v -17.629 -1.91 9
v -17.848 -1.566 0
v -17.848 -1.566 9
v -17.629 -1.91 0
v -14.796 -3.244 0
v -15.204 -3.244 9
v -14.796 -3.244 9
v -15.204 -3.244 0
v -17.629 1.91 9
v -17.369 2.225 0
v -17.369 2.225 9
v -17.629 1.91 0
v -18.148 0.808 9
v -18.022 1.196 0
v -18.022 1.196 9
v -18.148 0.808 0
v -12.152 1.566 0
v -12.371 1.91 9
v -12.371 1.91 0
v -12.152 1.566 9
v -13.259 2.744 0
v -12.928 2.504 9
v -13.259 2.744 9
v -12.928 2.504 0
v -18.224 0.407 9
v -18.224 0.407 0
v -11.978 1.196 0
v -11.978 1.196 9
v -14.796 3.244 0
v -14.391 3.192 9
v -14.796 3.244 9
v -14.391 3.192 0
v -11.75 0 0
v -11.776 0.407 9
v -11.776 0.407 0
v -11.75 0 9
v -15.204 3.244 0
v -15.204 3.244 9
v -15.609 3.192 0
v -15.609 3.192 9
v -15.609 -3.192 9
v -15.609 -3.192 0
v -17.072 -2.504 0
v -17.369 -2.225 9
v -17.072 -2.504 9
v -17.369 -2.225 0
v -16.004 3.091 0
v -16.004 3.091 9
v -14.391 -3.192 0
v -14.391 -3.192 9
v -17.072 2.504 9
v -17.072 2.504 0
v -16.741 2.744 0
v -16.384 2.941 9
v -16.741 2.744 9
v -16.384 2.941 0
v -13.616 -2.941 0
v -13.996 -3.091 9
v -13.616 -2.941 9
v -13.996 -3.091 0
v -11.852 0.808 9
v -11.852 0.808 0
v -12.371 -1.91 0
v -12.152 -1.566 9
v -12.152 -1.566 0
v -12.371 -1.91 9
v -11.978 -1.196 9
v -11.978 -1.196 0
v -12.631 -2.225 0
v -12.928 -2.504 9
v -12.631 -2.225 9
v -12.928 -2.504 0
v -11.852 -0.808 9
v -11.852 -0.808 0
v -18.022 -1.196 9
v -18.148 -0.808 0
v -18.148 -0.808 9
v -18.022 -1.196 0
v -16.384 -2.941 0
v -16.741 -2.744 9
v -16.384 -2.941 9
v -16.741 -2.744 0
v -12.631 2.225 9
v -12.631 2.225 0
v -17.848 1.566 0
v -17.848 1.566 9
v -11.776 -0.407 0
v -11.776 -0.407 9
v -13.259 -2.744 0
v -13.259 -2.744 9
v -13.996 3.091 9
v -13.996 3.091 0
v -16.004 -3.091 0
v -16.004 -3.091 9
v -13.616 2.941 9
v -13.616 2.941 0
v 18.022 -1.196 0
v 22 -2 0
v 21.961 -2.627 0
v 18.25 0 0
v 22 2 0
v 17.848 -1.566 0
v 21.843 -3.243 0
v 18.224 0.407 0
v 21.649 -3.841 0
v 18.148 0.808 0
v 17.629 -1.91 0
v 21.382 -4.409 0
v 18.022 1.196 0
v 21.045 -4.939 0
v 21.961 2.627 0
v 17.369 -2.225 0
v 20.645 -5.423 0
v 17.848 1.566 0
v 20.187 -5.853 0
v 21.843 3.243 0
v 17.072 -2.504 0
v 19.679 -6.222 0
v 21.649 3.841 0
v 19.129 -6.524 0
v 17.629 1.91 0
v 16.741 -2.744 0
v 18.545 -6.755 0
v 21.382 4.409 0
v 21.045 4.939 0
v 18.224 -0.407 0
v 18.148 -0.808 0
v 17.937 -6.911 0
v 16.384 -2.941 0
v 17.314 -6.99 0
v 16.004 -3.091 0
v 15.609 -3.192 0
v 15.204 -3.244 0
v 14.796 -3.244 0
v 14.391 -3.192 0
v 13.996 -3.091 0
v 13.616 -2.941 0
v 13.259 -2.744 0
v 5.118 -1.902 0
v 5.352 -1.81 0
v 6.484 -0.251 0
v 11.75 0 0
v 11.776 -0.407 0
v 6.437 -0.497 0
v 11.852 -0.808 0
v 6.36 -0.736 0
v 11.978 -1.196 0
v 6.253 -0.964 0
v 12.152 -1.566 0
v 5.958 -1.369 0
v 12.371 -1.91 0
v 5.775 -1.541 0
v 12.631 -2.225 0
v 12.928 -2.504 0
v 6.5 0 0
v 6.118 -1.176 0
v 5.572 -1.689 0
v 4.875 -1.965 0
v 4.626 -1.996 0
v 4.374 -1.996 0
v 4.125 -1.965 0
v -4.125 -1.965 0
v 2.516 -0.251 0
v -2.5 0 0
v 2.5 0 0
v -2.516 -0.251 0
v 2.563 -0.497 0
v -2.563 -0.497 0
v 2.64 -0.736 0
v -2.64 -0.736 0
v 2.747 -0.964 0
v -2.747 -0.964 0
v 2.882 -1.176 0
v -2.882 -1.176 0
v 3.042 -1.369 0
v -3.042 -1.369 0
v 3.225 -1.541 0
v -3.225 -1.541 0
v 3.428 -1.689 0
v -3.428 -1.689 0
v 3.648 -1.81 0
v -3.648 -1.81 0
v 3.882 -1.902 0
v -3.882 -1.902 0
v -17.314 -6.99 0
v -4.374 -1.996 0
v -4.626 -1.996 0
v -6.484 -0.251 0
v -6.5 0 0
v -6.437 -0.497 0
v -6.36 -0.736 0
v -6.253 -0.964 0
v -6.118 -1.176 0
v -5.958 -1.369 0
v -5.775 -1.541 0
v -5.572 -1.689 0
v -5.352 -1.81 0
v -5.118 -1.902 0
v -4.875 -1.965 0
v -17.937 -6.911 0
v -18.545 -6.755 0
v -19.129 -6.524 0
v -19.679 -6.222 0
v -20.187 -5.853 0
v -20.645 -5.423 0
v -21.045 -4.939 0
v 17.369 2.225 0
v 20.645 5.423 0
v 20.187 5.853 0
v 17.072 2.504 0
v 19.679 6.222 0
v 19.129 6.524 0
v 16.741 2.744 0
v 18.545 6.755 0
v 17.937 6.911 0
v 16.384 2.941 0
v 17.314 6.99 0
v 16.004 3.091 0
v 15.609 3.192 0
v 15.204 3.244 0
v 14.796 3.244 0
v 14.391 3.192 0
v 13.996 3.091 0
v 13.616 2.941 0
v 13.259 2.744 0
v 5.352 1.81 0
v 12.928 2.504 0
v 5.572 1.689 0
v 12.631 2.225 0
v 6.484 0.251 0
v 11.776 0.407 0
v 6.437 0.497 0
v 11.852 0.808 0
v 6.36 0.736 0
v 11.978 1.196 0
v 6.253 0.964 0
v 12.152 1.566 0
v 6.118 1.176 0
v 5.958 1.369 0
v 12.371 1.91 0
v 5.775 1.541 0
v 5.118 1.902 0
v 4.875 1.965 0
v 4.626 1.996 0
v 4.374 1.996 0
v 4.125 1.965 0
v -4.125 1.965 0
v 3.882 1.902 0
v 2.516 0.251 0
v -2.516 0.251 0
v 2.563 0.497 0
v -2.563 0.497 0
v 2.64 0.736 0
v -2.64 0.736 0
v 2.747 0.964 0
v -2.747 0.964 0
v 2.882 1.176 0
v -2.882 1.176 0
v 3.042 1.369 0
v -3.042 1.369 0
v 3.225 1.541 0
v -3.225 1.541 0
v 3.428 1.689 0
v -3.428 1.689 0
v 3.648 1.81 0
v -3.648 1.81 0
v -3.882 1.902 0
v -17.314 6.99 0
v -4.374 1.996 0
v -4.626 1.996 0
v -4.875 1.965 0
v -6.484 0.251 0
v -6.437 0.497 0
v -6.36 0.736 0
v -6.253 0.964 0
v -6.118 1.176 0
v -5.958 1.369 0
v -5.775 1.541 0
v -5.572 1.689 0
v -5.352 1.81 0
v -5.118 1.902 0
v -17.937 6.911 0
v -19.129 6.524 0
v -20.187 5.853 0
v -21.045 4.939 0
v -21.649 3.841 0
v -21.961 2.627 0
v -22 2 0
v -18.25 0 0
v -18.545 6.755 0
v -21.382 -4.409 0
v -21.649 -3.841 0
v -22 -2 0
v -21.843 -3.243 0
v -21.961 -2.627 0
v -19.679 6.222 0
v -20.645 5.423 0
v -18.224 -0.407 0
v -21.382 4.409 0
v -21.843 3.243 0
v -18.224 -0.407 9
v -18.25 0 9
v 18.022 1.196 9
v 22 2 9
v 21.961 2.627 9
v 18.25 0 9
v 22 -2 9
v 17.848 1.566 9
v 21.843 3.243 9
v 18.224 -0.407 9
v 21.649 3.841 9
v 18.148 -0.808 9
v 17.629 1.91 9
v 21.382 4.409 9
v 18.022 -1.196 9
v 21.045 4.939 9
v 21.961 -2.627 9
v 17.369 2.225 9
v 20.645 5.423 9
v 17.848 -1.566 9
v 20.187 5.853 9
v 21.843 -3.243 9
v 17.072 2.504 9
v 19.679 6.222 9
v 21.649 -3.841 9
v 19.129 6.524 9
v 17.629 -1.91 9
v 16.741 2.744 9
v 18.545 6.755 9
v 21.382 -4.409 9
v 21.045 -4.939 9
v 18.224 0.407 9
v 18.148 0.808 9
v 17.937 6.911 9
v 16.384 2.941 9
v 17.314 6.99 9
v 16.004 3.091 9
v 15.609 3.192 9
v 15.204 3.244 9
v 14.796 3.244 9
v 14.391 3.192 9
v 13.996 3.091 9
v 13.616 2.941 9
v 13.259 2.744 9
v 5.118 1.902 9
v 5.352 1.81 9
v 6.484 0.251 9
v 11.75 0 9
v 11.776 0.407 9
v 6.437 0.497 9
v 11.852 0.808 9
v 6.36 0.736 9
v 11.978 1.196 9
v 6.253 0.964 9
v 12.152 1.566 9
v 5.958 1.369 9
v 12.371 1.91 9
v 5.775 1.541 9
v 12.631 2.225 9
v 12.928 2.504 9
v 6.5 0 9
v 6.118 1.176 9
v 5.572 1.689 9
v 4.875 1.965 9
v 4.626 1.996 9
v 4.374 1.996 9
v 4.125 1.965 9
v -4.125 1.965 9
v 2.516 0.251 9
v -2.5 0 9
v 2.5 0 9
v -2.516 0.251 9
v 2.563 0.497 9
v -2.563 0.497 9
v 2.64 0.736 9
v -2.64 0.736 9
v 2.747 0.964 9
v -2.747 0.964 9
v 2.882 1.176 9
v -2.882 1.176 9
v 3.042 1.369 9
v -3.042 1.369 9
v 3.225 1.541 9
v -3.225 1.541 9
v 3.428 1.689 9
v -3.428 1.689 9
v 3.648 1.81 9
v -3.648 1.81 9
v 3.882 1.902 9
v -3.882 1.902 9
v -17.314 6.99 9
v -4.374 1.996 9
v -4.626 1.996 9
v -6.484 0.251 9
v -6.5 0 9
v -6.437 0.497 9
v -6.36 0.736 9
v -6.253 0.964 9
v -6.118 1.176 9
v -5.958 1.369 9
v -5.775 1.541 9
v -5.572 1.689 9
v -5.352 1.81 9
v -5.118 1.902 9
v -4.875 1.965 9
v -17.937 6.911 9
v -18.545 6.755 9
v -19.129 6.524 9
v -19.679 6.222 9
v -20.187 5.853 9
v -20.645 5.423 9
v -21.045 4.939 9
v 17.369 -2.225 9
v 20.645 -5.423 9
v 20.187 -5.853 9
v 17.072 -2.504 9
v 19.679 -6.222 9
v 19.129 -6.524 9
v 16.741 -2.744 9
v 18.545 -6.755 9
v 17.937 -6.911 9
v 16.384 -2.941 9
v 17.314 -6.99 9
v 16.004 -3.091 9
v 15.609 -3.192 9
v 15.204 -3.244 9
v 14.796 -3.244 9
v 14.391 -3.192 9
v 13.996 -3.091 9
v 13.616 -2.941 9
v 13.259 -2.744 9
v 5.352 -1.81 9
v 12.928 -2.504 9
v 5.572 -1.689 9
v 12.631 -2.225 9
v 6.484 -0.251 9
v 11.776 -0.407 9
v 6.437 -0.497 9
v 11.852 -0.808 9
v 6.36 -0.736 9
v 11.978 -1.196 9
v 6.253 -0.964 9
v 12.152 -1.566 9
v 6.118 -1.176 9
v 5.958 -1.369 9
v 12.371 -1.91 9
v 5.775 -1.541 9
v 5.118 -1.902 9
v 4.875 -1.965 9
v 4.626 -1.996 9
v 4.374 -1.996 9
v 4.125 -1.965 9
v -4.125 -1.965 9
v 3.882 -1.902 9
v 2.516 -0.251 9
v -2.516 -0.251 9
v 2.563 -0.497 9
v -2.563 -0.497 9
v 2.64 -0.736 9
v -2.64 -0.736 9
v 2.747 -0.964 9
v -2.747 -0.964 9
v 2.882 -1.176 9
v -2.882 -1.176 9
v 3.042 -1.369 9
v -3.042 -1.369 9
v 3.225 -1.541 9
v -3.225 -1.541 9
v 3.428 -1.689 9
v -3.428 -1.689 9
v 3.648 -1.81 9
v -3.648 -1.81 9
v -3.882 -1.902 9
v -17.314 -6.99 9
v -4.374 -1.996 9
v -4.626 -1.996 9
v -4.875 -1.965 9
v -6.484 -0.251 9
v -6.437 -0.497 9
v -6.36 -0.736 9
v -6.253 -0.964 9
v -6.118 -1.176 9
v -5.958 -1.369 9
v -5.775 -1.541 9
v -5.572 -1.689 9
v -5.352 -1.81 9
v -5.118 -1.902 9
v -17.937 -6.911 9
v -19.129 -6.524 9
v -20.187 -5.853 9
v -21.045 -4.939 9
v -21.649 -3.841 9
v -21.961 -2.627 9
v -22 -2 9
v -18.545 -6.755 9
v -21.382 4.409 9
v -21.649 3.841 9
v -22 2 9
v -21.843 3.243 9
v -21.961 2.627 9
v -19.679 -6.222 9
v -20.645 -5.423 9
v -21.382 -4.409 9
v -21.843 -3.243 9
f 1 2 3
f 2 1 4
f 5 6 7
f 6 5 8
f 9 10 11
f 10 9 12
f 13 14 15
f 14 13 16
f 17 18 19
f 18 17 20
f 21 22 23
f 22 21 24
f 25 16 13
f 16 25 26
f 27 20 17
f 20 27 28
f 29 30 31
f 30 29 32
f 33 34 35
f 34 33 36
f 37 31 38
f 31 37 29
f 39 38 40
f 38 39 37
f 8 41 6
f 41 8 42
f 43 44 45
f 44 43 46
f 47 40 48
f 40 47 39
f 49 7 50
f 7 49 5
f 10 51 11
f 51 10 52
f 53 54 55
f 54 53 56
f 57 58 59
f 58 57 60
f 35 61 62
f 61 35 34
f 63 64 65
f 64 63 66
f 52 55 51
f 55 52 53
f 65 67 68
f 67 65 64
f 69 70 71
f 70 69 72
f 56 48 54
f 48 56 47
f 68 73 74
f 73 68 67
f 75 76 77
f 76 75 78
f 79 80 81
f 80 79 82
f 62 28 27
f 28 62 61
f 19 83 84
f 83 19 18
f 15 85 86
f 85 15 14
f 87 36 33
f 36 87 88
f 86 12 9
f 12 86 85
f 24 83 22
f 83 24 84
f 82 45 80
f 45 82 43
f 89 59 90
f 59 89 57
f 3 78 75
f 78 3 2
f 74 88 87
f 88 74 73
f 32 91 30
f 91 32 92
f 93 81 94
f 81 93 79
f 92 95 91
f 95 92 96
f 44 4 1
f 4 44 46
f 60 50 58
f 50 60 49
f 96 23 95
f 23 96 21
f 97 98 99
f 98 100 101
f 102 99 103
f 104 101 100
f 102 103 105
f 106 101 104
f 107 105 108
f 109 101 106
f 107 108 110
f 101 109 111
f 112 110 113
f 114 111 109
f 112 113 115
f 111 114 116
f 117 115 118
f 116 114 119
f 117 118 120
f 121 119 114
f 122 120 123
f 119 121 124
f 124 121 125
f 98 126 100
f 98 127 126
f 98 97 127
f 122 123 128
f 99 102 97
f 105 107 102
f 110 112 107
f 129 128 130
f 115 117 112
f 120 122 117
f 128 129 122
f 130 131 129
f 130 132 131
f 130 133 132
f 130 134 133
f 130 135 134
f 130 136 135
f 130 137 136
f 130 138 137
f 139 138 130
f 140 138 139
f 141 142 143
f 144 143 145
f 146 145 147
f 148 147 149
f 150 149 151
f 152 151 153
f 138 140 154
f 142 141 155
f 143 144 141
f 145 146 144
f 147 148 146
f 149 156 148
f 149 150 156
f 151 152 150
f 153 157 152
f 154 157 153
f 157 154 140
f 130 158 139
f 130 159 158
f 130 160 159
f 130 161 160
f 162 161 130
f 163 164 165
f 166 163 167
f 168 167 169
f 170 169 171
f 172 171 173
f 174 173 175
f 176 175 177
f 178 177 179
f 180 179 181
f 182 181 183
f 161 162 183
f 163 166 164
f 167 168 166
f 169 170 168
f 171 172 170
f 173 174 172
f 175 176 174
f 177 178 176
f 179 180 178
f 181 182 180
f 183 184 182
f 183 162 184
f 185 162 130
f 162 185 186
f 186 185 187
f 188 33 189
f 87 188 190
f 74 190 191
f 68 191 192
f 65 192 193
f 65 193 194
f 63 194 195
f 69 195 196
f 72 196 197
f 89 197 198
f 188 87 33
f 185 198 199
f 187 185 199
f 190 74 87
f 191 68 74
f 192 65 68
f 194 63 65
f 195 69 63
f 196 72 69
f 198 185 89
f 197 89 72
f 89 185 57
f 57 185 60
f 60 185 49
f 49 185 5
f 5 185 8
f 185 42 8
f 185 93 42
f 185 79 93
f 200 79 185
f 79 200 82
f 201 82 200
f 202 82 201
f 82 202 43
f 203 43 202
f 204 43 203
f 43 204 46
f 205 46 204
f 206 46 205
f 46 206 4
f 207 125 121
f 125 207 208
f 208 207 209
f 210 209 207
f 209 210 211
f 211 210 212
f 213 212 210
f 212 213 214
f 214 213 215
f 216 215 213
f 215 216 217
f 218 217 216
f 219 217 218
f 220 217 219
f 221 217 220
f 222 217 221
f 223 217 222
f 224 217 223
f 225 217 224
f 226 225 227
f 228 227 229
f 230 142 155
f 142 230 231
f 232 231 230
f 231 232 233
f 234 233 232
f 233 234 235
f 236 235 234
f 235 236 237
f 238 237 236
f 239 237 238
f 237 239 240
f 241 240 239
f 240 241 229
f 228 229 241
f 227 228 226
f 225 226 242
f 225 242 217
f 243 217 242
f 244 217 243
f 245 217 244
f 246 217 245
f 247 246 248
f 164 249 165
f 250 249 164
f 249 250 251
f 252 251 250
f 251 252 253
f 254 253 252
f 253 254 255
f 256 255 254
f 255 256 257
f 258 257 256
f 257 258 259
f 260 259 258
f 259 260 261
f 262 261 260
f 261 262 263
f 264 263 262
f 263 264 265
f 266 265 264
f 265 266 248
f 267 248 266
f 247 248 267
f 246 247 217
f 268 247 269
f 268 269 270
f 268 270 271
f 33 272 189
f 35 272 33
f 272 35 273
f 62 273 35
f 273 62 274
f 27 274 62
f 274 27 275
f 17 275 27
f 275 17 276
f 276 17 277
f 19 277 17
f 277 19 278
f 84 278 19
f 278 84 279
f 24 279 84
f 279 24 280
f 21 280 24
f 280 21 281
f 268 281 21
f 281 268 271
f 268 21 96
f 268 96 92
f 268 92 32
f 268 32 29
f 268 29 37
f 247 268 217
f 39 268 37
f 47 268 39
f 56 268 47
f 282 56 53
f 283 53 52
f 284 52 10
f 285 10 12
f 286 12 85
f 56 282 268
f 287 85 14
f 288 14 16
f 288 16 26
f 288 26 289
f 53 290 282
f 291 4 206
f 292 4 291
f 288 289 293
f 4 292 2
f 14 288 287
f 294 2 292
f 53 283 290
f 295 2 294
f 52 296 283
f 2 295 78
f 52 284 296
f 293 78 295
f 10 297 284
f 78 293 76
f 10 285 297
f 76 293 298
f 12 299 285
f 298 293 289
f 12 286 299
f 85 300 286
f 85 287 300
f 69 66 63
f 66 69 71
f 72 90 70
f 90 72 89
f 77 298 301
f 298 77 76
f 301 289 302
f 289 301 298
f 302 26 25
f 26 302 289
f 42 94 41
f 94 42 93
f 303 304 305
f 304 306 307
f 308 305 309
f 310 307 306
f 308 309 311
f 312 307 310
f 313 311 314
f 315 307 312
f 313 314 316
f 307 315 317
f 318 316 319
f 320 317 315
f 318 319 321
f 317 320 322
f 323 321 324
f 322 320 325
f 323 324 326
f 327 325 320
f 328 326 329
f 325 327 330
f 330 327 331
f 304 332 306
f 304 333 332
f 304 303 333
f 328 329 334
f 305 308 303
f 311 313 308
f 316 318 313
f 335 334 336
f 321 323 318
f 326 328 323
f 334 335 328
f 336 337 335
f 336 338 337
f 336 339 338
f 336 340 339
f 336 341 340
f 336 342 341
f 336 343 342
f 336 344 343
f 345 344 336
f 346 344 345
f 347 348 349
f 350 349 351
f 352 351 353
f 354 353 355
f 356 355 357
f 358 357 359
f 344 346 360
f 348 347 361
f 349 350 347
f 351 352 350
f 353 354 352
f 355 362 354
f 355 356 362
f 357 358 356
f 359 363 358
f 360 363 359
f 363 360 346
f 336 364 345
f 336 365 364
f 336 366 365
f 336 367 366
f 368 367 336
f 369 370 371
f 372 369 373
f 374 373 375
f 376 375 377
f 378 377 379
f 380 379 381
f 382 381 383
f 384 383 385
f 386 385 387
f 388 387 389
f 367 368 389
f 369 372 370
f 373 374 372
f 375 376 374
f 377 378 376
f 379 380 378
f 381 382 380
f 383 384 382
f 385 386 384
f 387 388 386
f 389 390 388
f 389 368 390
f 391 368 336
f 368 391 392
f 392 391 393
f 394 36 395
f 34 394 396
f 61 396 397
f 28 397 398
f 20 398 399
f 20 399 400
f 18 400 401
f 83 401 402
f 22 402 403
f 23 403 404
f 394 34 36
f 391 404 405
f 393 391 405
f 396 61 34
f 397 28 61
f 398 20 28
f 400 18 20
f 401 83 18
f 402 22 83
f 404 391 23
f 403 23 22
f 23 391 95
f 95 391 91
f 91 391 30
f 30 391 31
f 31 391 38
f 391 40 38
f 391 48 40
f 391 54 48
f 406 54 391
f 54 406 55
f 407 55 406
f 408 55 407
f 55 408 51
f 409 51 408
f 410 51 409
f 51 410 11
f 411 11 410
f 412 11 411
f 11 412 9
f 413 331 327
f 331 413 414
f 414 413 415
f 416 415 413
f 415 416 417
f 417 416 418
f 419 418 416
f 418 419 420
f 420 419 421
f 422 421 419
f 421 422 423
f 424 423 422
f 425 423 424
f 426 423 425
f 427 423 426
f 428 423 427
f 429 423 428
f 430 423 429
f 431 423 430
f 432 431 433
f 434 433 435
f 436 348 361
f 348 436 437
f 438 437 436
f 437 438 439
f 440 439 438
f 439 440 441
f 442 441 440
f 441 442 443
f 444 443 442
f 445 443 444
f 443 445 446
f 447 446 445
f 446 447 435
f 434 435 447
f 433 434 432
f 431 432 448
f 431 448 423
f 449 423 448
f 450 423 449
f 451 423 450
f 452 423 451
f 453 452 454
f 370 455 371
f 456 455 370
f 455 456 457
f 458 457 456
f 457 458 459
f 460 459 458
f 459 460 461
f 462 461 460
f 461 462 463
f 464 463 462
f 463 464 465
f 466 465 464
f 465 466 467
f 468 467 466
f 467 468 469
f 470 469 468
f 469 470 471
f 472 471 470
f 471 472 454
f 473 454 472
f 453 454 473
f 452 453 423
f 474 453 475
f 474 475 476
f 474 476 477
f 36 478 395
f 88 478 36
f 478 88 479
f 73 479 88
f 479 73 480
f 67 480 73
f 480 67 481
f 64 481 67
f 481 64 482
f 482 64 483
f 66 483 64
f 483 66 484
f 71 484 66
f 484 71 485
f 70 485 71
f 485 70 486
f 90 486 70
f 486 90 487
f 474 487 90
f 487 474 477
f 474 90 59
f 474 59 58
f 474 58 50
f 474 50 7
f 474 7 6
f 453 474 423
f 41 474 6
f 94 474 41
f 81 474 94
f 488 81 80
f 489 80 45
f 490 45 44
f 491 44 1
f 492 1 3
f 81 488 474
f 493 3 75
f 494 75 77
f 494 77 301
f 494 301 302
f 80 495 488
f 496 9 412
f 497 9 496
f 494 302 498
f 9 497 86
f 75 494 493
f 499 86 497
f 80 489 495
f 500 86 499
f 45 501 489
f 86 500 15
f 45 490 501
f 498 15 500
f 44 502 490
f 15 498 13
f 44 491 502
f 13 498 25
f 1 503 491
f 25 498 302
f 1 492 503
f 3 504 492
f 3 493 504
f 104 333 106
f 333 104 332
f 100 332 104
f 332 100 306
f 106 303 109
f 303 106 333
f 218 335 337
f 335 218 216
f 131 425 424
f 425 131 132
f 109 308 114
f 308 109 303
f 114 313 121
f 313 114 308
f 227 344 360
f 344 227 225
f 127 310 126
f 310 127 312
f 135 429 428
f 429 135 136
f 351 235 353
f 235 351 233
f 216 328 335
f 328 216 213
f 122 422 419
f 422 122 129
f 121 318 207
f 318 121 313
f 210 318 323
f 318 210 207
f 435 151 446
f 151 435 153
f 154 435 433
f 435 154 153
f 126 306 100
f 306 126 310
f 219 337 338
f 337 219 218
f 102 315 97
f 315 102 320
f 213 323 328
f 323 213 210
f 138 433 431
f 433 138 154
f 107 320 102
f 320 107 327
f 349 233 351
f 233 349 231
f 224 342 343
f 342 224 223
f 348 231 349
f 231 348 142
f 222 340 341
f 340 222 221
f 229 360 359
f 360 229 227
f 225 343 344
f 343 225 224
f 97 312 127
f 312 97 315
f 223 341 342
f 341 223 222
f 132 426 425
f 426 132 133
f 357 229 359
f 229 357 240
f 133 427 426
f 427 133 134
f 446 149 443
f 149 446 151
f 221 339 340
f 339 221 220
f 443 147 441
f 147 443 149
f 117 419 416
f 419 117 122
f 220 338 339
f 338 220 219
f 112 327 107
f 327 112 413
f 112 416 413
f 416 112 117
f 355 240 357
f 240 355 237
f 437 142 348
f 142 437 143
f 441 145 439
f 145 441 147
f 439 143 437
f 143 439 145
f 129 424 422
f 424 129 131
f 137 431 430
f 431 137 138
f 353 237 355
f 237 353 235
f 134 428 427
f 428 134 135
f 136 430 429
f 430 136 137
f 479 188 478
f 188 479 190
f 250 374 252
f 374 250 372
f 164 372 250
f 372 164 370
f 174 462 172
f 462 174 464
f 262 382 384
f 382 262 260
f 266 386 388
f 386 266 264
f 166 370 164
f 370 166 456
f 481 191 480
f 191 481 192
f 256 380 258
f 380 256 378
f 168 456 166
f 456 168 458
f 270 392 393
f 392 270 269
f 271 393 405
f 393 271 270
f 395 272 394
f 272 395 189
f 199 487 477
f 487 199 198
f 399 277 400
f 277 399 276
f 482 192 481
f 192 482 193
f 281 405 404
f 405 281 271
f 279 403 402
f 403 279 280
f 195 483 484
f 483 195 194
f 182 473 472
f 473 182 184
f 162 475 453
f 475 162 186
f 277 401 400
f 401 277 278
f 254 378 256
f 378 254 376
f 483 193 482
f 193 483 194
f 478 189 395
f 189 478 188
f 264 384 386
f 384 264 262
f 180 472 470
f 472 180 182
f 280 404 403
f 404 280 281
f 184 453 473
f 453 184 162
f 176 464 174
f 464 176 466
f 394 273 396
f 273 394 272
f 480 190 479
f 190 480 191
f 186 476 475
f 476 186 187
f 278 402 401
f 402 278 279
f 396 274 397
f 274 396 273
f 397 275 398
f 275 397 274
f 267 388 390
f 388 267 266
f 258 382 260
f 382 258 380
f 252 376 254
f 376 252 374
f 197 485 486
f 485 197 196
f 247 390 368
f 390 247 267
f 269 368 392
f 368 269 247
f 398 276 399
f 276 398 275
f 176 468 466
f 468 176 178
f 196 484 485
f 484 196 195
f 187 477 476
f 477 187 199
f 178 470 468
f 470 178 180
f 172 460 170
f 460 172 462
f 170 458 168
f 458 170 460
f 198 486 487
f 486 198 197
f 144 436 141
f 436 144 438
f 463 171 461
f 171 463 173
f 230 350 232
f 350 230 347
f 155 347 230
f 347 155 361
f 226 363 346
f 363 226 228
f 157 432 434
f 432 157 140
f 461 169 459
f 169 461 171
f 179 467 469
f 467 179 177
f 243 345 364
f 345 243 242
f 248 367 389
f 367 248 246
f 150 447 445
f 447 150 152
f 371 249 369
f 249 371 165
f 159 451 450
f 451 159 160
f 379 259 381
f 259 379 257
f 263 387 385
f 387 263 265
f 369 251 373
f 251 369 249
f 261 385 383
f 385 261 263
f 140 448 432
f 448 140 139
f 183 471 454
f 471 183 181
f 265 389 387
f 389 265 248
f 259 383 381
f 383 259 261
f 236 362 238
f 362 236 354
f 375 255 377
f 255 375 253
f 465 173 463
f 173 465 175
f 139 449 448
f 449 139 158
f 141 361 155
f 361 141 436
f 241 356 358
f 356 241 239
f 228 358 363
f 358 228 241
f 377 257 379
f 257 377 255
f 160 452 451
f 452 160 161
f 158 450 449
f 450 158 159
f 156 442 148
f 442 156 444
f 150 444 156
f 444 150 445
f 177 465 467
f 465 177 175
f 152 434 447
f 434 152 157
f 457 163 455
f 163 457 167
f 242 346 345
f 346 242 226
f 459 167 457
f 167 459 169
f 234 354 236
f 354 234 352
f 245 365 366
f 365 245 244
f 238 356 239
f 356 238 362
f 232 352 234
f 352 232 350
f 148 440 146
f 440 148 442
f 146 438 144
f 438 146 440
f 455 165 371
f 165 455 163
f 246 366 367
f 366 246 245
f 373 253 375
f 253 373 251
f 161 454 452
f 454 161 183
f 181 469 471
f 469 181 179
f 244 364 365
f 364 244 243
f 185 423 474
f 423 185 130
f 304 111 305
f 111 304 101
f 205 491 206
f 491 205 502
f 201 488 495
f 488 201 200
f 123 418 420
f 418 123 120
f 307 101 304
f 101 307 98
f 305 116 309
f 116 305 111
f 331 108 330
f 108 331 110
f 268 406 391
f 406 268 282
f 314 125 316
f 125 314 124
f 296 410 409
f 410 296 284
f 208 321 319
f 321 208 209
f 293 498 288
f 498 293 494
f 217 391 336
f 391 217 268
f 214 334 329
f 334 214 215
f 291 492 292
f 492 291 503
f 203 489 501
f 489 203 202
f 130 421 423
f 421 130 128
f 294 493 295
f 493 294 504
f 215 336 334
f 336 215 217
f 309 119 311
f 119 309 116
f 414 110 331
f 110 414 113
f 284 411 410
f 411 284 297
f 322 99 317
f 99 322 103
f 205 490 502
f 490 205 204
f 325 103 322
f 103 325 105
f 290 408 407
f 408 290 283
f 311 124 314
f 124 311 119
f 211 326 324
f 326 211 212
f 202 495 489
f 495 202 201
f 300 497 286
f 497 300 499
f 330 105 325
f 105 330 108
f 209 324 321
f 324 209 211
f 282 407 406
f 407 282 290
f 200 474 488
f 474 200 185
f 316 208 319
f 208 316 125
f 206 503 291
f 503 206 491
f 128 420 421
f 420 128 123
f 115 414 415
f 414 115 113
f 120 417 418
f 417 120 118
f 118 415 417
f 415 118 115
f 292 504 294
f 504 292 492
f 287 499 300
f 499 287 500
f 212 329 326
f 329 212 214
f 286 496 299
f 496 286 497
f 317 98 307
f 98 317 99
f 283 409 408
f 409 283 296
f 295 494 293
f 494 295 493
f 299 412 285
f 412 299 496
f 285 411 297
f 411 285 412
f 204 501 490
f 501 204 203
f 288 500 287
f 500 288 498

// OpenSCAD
$fn = 50;

difference() {
	union() {
		hull() {
			translate(v = [-17.0, 2.0, 0]) {
				cylinder(h = 9, r = 5);
			}
			translate(v = [17.0, 2.0, 0]) {
				cylinder(h = 9, r = 5);
			}
			translate(v = [-17.0, -2.0, 0]) {
				cylinder(h = 9, r = 5);
			}
			translate(v = [17.0, -2.0, 0]) {
				cylinder(h = 9, r = 5);
			}
		}
	}
	union() {
		translate(v = [-15.0, 0.0, 0]) {
			cylinder(h = 9, r = 3.25);
		}
		translate(v = [15.0, 0.0, 0]) {
			cylinder(h = 9, r = 3.25);
		}
		translate(v = [-4.5, 0, 0.0]) {
			cylinder(h = 9, r = 2.0);
		}
		translate(v = [4.5, 0, 0.0]) {
			cylinder(h = 9, r = 2.0);
		}
	}
}
